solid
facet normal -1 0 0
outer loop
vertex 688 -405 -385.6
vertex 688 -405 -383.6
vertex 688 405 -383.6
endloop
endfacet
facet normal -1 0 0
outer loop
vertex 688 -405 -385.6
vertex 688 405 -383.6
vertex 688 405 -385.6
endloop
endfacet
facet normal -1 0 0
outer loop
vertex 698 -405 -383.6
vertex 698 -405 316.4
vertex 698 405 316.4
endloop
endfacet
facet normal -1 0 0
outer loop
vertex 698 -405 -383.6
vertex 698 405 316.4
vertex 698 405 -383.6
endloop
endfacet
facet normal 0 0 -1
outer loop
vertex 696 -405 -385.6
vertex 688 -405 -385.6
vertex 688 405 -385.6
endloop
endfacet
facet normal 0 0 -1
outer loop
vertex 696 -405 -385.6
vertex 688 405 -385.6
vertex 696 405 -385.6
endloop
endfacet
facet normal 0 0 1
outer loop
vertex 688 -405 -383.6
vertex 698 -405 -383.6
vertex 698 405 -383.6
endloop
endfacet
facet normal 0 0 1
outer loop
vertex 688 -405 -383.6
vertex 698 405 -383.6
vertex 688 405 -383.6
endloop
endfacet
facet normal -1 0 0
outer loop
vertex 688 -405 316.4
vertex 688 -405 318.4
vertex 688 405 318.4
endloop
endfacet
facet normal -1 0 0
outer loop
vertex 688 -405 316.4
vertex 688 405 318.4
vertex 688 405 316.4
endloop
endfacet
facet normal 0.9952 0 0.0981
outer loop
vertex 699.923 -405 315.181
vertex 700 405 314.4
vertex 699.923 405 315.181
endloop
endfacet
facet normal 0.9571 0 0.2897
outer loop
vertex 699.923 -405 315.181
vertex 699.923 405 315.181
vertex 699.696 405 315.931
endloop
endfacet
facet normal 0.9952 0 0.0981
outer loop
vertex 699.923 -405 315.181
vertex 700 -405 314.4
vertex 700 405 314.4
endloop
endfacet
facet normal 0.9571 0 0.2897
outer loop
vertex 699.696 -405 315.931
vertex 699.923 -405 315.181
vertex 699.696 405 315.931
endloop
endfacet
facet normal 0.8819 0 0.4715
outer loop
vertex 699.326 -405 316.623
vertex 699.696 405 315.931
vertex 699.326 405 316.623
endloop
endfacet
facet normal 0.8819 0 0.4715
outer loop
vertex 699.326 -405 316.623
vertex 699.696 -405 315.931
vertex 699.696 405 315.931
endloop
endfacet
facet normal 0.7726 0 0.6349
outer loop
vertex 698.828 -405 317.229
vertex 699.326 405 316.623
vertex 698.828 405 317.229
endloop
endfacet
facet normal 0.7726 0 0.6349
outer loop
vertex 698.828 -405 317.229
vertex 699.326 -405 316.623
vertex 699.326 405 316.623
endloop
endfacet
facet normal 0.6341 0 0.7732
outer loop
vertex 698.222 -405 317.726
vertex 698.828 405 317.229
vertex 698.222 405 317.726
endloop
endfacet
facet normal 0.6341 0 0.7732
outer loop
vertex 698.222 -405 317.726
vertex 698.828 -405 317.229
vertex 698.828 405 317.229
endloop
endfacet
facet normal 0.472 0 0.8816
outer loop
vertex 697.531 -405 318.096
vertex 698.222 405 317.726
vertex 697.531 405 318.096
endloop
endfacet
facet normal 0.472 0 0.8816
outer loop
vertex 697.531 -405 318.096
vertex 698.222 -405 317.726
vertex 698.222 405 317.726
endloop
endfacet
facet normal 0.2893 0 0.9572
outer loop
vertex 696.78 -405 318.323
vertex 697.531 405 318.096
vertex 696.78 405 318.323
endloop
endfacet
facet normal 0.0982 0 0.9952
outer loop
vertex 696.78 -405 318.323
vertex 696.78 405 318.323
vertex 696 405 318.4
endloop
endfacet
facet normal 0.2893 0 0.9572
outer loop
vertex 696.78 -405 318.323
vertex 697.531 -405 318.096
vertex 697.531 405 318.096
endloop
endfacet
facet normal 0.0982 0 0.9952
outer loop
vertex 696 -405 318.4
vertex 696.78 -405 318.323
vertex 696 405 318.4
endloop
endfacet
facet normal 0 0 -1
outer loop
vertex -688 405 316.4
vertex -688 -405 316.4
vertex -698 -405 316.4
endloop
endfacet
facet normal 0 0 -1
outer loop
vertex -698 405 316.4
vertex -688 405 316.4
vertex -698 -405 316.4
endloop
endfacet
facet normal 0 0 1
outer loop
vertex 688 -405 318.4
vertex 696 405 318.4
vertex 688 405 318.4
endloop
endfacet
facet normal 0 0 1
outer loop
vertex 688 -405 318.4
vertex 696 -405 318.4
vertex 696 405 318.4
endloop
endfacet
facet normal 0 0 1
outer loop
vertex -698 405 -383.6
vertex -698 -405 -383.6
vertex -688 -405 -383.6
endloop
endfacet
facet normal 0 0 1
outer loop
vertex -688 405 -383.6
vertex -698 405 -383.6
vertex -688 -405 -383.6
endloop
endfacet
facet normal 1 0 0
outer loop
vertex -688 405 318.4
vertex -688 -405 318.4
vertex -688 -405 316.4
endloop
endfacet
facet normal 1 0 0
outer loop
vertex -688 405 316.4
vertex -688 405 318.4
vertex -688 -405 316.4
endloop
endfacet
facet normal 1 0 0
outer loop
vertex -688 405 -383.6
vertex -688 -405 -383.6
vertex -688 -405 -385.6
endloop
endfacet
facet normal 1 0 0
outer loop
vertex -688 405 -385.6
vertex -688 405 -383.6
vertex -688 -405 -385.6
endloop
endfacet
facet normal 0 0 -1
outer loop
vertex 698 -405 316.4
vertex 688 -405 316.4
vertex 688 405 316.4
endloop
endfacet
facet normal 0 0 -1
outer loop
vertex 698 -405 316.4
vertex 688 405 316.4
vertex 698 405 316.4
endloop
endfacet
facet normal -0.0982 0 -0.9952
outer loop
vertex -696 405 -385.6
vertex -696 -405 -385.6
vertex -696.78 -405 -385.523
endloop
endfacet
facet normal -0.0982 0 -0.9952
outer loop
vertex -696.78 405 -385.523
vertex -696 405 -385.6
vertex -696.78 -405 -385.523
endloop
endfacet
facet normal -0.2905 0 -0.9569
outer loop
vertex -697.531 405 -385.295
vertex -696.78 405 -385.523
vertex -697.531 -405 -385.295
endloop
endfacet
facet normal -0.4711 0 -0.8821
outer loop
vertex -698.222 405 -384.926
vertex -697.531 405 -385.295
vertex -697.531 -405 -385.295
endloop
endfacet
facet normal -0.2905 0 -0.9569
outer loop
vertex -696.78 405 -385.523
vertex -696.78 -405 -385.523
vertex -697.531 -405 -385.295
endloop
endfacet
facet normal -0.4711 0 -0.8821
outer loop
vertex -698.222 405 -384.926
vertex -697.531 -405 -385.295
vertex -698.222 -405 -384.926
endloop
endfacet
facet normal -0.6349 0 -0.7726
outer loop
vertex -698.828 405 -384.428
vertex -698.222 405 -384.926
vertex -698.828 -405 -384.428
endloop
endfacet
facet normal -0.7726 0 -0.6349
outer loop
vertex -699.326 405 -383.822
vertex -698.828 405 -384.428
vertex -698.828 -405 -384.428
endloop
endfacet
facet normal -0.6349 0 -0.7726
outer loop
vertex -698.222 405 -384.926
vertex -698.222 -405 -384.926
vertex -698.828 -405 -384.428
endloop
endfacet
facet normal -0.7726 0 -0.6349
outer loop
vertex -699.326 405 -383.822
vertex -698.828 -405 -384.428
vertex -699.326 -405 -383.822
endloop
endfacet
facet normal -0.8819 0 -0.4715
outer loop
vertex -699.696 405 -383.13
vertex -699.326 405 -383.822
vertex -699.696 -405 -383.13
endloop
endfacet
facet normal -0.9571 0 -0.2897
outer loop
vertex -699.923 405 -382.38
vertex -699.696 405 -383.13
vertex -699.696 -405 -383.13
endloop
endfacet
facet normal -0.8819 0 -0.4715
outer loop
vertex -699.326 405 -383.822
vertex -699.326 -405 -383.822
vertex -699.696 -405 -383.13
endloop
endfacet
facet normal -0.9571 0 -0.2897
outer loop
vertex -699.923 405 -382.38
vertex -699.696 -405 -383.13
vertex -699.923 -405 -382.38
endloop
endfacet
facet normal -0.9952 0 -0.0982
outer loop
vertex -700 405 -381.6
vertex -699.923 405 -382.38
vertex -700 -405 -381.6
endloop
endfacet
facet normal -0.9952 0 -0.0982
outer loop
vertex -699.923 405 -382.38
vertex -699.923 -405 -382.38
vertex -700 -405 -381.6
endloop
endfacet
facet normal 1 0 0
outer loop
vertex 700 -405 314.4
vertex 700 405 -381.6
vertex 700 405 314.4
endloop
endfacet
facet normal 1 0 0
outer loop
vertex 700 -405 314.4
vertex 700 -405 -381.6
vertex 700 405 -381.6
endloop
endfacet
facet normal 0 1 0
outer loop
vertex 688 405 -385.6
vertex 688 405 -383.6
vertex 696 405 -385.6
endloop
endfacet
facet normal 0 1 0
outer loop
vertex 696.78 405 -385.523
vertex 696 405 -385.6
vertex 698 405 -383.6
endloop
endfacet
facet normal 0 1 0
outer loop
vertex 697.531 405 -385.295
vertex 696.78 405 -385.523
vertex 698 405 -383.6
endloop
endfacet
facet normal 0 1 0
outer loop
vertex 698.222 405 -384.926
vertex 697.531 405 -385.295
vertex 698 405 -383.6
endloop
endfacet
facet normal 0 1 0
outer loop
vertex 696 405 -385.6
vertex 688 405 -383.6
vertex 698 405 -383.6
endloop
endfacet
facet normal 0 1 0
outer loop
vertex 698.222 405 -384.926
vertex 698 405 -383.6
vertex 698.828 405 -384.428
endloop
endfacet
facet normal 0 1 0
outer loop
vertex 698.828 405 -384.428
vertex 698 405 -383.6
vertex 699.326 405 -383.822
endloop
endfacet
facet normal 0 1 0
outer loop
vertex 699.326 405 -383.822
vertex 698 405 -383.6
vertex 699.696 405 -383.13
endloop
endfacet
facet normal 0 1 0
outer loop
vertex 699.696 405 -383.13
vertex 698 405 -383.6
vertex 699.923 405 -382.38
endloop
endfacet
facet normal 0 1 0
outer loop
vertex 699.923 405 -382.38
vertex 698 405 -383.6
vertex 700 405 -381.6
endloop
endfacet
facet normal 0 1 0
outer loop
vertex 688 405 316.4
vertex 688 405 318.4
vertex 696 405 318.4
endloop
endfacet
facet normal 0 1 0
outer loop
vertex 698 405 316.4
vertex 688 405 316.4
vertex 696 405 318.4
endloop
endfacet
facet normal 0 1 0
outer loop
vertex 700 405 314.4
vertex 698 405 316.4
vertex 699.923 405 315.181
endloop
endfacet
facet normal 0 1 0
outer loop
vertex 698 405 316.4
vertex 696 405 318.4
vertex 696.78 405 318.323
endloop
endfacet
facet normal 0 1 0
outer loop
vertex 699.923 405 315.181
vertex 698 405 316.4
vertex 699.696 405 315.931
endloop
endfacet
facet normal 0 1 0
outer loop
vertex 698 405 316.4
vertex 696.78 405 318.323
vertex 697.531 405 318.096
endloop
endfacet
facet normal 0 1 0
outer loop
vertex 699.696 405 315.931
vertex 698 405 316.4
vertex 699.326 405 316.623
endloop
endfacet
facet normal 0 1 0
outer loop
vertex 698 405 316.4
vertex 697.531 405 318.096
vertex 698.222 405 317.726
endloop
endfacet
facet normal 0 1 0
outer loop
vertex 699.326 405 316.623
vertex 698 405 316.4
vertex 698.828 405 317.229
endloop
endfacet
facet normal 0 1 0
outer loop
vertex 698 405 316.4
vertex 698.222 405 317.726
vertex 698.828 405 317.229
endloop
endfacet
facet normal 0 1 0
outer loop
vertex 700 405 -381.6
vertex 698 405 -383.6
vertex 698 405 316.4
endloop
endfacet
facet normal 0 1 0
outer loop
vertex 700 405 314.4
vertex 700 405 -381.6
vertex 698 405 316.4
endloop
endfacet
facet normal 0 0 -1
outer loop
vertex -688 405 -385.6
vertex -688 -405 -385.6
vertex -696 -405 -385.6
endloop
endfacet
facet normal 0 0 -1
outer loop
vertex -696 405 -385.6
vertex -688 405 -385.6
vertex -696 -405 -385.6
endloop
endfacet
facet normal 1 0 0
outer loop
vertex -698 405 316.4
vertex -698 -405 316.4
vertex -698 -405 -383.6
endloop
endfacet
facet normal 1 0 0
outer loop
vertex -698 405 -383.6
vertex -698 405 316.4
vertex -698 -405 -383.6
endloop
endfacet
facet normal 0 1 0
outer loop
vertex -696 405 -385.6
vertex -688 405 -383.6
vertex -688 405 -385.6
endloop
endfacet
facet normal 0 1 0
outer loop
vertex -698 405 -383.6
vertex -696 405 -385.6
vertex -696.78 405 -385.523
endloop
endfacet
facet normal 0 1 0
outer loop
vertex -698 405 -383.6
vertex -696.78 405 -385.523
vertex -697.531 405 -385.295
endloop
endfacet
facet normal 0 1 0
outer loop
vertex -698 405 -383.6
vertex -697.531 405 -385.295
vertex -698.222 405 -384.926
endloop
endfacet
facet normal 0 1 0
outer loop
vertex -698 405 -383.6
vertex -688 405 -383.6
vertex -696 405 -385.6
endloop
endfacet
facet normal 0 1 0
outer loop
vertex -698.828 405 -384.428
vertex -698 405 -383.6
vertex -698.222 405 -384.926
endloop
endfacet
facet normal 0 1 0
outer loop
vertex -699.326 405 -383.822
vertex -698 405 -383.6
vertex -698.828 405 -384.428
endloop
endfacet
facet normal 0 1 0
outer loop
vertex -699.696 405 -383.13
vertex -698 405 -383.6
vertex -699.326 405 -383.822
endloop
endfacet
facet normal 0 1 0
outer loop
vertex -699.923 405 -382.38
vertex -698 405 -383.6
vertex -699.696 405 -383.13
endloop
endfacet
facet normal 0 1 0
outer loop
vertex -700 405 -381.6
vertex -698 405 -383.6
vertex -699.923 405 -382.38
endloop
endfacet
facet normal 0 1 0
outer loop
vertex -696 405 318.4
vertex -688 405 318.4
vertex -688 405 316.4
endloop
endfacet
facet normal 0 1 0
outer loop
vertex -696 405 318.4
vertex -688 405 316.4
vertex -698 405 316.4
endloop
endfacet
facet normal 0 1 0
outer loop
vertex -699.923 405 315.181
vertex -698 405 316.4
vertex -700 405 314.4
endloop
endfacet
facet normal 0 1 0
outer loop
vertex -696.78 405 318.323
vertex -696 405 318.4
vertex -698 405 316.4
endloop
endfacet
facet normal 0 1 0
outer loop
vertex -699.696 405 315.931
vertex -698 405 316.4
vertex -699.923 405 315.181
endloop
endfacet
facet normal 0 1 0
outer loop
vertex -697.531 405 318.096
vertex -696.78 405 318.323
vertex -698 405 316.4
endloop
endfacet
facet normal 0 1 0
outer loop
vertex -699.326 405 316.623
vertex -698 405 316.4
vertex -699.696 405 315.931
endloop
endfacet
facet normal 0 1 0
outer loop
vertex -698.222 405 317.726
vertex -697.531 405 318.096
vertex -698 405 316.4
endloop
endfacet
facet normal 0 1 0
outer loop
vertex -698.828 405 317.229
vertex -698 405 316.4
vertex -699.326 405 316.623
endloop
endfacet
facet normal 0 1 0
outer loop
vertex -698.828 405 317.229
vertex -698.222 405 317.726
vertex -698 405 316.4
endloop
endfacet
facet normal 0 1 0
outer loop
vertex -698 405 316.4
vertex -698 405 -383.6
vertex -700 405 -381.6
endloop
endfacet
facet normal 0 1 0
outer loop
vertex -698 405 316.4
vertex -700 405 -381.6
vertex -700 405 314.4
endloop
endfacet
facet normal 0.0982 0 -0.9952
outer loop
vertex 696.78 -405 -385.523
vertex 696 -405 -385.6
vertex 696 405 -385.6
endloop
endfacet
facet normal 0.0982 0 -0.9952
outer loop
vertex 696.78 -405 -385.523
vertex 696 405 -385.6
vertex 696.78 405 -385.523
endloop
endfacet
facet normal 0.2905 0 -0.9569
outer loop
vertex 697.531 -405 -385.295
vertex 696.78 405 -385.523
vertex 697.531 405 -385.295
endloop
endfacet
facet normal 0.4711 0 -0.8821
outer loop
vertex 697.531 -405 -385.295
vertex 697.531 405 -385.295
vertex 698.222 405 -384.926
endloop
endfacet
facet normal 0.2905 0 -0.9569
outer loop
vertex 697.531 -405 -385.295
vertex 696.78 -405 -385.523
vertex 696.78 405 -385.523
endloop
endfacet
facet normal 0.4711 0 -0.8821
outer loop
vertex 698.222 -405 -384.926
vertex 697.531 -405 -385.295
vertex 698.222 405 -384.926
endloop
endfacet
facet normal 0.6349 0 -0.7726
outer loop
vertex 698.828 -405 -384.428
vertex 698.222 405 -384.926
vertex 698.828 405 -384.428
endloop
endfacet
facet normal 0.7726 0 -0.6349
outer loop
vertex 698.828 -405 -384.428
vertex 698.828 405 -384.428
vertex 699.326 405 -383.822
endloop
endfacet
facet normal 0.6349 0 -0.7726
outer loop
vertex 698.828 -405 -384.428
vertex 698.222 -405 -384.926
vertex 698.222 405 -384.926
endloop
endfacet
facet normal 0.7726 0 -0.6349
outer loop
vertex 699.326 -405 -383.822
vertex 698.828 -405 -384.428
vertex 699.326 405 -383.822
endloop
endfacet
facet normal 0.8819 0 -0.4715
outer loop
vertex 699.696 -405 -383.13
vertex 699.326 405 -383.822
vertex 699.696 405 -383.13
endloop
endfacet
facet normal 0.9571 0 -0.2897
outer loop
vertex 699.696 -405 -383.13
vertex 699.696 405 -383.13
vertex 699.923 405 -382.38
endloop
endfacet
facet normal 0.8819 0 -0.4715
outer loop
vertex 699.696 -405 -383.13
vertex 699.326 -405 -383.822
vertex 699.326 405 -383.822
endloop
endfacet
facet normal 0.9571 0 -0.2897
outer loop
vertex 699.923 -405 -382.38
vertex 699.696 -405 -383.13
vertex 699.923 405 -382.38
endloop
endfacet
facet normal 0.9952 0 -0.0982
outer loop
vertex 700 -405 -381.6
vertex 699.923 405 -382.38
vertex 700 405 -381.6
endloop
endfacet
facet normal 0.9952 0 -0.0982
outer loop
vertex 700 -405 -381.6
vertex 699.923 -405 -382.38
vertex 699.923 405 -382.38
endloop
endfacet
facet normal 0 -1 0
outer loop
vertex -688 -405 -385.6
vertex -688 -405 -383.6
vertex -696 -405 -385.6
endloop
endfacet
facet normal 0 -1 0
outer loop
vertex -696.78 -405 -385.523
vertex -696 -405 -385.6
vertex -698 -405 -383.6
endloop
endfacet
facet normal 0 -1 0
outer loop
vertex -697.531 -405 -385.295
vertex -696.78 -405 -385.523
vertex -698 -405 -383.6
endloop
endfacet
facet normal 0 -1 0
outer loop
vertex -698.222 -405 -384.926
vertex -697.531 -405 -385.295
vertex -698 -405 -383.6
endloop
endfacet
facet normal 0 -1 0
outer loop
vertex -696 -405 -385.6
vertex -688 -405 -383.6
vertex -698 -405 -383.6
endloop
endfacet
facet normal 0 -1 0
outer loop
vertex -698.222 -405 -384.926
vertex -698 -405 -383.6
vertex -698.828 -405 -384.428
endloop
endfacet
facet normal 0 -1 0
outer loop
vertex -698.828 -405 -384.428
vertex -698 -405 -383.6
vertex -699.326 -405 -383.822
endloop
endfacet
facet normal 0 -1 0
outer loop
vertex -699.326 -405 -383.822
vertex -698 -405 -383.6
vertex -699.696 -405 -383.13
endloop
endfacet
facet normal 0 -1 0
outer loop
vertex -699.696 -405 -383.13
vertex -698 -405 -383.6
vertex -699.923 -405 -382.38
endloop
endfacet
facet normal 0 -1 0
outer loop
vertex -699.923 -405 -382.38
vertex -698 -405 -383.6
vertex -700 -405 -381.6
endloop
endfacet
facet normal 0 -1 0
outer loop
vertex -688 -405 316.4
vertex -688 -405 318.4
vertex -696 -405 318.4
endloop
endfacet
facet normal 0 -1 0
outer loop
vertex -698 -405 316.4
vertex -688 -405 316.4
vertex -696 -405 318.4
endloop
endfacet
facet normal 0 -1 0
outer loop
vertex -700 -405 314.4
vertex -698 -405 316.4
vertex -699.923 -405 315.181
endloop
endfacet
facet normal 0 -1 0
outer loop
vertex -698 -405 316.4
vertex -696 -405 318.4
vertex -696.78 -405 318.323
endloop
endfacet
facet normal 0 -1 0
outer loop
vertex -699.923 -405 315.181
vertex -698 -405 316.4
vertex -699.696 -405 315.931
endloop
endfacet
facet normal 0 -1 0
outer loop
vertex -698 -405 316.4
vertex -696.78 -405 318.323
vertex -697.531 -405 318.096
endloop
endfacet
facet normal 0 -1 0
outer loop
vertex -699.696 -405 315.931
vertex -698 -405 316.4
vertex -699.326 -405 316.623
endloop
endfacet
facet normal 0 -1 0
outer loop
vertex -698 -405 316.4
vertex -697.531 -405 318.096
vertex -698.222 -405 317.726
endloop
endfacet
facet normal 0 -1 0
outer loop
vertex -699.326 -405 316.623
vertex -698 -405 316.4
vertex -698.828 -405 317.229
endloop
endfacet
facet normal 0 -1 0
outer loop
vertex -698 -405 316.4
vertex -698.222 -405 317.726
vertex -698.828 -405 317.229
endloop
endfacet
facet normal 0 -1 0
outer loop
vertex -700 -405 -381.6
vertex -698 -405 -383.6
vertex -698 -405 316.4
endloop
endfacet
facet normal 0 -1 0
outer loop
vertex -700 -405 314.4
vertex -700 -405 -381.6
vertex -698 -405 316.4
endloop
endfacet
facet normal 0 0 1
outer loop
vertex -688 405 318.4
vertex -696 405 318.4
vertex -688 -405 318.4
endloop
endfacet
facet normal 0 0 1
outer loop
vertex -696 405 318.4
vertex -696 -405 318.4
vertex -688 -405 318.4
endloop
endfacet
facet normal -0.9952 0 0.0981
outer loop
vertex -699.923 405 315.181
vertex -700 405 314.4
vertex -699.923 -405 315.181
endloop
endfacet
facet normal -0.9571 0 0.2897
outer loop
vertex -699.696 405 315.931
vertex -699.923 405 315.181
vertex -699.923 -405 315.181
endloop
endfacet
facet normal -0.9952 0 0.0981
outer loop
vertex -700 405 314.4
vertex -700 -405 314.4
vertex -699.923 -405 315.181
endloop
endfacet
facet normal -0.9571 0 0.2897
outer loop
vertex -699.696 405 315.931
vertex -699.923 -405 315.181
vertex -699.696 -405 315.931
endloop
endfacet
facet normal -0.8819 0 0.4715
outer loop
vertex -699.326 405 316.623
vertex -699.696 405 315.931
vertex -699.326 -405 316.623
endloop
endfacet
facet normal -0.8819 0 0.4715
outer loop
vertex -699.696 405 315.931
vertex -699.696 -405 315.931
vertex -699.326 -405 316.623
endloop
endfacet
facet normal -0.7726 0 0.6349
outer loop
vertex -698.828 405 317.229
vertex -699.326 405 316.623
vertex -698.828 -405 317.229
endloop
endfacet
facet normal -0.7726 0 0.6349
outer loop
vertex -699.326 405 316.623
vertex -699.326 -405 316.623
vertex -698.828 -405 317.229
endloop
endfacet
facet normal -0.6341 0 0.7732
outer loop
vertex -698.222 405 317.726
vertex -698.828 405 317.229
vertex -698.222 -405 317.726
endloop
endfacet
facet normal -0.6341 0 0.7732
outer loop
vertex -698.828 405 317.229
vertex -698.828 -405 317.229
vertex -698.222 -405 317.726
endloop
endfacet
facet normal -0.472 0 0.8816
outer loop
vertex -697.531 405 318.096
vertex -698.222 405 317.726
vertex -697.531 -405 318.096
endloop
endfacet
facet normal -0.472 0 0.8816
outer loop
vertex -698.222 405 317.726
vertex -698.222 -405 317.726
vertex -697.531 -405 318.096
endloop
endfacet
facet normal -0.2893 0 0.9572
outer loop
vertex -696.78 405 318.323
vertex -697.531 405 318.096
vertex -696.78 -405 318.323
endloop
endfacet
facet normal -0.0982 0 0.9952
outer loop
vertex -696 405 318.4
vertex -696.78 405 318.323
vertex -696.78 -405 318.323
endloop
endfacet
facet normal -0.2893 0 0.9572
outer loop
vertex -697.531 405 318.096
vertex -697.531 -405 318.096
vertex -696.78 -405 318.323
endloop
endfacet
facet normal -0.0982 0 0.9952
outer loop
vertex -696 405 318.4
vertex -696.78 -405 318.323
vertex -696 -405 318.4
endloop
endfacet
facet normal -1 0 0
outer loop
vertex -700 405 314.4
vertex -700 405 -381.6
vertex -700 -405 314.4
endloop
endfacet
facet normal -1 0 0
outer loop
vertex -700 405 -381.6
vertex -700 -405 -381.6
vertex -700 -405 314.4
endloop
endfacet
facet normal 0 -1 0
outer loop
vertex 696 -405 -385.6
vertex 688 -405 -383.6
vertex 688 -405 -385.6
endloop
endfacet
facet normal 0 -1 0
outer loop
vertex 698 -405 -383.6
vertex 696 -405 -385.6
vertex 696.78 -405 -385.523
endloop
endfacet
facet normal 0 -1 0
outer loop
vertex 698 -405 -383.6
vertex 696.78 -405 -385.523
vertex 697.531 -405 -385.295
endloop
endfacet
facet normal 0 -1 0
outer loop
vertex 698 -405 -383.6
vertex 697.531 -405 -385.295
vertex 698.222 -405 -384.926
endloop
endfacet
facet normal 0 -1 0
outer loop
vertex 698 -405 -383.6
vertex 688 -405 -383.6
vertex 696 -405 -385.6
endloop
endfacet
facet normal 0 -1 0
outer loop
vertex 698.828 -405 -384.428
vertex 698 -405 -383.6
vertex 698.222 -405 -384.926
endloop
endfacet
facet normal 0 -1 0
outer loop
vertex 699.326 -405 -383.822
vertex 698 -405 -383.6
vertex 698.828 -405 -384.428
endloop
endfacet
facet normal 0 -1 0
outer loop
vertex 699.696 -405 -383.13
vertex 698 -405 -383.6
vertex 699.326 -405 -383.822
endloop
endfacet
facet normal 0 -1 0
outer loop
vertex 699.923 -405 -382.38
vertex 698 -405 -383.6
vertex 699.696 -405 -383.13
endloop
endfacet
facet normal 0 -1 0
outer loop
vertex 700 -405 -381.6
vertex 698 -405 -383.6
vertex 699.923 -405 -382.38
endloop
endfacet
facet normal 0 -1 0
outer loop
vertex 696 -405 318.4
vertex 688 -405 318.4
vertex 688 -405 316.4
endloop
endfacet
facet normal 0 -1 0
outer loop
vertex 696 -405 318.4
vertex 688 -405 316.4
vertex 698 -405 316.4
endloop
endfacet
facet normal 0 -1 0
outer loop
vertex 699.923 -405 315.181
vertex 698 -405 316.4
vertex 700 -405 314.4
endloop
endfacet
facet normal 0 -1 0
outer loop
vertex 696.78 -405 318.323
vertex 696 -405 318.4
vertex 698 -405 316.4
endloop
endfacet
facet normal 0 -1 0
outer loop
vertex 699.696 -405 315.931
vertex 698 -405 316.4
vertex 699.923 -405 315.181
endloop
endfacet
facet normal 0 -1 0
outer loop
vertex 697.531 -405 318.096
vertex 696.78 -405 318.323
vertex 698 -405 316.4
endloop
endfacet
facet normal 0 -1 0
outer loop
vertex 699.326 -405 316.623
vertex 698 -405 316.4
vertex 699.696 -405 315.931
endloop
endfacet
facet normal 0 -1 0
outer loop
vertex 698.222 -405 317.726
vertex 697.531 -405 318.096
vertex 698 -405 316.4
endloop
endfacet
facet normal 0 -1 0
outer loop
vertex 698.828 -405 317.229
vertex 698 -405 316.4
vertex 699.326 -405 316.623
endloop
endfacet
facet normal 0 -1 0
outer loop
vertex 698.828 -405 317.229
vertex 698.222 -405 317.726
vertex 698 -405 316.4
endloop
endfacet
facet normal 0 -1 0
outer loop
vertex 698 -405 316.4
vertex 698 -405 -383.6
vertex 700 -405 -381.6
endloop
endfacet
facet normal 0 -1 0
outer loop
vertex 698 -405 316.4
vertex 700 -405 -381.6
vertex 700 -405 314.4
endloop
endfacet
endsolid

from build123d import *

# Parameters (mm, degrees)
F1_DEPTH = 405


with BuildPart() as f1:
    # F0 (on Front) → F1 (new body, symmetric)
    with BuildSketch(Plane.XZ):
        with BuildLine():
            Line((696, 318.400318), (688, 318.400318))
            Line((688, 318.400318), (688, 316.400318))
            Line((688, 316.400318), (698, 316.400318))
            Line((698, 316.400318), (698, -383.599682))
            Line((698, -383.599682), (688, -383.599682))
            Line((688, -383.599682), (688, -385.599682))
            Line((688, -385.599682), (696, -385.599682))
            ThreePointArc((696, -385.599682), (698.828427, -384.428109), (700, -381.599682))
            Line((700, -381.599682), (700, 314.400318))
            ThreePointArc((700, 314.400318), (698.828427, 317.228745), (696, 318.400318))
        make_face()
    extrude(amount=F1_DEPTH, both=True)


with BuildPart() as f2_1:
    # F2: instance of F1
    add(f1.part.mirror(Plane.YZ))


solid = Compound([f1.part, f2_1.part])
